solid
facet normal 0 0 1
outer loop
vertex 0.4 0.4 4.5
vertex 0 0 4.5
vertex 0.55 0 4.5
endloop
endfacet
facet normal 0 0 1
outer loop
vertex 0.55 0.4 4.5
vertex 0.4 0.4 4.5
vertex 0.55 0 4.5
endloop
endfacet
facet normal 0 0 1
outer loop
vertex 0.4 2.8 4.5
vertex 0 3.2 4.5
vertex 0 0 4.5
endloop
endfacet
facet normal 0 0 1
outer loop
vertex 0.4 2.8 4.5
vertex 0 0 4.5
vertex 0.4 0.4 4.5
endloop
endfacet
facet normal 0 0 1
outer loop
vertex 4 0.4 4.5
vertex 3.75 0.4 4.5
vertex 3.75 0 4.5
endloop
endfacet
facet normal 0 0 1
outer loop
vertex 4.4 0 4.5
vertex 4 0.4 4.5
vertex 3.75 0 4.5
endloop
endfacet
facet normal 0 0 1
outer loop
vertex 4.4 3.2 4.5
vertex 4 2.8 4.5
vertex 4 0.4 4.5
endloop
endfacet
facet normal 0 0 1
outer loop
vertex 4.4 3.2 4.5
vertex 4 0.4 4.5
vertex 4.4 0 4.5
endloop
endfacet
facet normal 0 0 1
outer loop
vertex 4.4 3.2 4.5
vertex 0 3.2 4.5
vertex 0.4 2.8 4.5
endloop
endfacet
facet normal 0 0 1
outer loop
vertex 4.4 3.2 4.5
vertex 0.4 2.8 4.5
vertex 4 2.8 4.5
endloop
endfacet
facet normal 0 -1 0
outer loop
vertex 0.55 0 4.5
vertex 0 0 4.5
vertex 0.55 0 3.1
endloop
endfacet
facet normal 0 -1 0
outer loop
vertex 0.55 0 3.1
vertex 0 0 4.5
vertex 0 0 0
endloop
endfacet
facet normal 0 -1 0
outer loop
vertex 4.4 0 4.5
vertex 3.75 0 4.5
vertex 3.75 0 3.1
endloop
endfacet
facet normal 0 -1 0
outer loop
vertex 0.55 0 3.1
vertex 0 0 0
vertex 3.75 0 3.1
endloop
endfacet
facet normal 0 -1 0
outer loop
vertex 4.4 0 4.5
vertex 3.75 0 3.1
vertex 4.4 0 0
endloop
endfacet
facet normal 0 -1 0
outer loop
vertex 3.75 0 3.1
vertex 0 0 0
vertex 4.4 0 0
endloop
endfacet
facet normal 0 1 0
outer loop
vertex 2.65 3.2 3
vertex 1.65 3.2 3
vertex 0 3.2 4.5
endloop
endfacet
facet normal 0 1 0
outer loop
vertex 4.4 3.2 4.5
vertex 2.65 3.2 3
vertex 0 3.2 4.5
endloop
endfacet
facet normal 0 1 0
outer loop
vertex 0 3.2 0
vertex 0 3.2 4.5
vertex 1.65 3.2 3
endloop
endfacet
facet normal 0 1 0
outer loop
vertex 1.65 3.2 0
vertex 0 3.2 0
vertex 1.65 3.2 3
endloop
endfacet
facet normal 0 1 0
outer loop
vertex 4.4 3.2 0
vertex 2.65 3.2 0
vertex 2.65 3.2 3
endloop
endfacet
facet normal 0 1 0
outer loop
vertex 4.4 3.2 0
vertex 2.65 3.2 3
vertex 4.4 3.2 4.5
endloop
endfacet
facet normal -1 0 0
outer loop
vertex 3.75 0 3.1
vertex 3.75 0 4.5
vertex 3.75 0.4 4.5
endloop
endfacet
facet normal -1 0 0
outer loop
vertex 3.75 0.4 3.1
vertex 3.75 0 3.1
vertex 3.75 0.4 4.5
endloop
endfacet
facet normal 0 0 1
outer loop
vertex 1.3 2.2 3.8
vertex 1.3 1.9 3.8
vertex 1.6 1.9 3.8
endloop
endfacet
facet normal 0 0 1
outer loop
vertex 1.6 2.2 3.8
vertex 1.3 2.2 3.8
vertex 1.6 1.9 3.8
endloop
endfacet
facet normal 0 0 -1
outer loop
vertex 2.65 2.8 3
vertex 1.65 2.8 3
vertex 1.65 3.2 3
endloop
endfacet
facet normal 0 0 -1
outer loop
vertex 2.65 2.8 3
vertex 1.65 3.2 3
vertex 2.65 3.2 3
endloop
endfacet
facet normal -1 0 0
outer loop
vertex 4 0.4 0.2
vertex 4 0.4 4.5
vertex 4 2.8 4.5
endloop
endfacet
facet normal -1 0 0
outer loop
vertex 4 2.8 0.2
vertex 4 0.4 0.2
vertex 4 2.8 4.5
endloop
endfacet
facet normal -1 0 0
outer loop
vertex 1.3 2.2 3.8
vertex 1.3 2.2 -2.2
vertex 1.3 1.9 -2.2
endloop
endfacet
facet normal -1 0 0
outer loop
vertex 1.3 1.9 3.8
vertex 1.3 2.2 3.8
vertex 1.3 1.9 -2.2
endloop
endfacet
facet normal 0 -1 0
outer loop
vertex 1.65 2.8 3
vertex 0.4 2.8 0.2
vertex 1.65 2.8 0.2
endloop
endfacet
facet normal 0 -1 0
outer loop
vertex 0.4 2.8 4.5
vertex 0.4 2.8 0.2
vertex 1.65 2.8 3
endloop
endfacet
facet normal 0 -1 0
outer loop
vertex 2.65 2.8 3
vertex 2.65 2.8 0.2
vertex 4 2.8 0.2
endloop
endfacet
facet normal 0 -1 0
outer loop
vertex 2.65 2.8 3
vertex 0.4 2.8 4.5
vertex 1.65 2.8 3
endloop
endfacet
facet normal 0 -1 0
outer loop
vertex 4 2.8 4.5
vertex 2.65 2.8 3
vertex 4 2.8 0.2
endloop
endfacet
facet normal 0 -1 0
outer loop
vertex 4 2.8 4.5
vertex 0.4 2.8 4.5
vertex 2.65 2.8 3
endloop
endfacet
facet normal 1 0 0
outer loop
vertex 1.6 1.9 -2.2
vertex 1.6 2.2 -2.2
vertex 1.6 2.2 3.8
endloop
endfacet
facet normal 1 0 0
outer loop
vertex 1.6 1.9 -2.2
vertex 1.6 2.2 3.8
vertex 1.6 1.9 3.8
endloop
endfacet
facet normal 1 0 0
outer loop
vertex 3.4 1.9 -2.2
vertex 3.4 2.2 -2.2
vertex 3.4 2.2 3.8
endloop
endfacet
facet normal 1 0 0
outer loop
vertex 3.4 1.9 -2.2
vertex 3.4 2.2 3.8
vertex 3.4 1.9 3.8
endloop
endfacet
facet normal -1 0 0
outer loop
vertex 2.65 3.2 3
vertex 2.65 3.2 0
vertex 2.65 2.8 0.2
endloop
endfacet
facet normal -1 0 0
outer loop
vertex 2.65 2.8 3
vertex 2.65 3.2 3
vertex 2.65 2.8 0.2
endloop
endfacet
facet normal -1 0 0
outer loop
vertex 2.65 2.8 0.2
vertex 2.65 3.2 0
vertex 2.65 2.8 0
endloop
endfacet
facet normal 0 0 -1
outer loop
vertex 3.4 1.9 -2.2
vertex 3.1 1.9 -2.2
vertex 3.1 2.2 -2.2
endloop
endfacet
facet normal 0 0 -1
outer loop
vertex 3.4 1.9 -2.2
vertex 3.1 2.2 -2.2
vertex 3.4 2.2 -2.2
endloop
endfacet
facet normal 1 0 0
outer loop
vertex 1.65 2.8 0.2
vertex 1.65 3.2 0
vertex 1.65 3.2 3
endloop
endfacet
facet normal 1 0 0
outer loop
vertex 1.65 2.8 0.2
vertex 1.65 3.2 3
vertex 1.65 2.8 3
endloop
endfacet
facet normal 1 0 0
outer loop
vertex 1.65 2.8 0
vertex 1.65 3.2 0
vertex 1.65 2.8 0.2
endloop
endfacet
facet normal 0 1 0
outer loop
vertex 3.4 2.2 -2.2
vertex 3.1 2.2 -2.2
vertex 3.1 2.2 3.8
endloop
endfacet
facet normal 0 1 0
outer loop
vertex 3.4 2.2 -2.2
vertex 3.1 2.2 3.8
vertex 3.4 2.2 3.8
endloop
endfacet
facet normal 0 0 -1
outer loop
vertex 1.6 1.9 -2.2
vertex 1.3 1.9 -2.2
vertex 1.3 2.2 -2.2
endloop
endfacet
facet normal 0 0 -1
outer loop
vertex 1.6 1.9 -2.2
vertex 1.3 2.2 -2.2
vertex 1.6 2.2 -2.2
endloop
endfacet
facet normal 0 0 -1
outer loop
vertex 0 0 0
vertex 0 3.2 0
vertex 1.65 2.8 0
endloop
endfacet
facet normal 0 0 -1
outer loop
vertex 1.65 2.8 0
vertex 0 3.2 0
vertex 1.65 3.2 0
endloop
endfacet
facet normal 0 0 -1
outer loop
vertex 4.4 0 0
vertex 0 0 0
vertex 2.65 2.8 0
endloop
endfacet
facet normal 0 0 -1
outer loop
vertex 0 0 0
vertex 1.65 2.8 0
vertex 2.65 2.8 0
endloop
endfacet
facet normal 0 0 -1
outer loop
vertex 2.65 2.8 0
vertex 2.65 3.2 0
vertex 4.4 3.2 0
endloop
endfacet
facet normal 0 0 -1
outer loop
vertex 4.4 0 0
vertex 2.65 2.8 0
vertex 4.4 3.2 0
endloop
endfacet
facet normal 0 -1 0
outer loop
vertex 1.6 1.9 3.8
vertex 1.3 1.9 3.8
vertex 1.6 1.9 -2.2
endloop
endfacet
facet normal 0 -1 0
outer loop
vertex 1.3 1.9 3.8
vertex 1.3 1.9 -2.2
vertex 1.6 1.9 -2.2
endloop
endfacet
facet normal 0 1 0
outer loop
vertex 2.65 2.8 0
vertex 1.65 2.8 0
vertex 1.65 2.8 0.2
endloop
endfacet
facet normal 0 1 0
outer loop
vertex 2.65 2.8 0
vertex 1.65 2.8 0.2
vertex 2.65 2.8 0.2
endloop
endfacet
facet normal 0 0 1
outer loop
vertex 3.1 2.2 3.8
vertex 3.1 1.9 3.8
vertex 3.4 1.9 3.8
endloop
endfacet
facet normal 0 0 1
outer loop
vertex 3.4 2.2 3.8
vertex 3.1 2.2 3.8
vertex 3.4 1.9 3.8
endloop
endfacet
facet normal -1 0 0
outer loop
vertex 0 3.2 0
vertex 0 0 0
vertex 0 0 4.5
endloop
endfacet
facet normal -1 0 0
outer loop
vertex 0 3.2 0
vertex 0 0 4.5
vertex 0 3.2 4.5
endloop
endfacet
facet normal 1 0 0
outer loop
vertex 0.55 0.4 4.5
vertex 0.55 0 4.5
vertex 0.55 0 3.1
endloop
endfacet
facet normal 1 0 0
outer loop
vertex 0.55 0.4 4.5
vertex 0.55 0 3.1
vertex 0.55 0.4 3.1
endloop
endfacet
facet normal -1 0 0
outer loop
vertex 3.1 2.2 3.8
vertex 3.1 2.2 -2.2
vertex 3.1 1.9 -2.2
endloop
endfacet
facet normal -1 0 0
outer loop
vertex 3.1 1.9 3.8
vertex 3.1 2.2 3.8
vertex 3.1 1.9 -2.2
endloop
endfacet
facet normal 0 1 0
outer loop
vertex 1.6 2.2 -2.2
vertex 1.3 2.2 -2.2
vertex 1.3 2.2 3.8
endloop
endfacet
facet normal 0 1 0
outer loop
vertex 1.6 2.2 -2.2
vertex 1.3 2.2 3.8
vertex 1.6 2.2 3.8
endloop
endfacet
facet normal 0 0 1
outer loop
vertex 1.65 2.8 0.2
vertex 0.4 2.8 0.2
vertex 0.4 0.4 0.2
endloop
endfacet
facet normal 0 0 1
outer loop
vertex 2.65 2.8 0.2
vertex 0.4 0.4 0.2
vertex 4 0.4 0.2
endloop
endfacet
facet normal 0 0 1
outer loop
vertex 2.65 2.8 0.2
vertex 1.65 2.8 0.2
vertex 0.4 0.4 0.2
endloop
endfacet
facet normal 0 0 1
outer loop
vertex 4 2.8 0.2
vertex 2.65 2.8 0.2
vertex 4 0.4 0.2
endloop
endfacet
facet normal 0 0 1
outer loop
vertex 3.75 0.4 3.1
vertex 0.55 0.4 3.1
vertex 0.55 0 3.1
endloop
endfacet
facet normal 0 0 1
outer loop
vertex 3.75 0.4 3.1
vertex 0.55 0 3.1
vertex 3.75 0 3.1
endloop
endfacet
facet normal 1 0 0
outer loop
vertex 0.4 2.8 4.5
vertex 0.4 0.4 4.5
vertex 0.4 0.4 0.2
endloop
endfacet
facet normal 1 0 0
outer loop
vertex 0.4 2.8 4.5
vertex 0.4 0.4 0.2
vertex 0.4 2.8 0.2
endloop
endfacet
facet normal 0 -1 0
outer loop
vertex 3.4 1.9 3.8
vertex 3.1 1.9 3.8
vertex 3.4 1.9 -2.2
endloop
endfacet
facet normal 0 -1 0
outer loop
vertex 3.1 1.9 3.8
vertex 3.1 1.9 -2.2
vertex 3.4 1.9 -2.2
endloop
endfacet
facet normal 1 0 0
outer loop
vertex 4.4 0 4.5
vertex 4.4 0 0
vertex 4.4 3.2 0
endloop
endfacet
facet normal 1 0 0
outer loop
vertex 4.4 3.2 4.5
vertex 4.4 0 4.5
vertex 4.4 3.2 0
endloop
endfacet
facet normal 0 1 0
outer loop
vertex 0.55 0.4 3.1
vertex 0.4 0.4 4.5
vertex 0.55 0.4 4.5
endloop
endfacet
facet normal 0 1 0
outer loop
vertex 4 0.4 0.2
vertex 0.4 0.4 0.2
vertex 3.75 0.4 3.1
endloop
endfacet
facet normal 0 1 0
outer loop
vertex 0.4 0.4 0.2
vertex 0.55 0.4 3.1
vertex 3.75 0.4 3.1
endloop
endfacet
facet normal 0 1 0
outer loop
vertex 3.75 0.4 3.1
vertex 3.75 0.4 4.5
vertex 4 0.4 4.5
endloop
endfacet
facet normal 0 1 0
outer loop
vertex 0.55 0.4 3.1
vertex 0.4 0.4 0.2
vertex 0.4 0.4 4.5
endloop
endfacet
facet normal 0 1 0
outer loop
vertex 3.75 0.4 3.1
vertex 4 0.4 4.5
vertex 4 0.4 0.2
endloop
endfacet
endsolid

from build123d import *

# Parameters (mm, degrees)
F0_W          = 4.4
F0_H          = 3.2
F1_DEPTH      = 4.5
F2_W          = 3.6
F2_H          = 2.4
F3_DEPTH      = 4.3
F4_W          = 3.2
F4_H          = 0.4
F5_DEPTH      = 1.4
F6_W          = 1
F6_H          = 0.4
F7_DEPTH      = 3
F8_W          = 0.3
F8_H          = 0.3
F9_DEPTH      = 2.2
F9_DEPTH_BACK = 3.8


with BuildPart() as f1:
    # F0 (on Top) → F1 (new body)
    with BuildSketch(Plane.XY):
        with Locations((2.2, 1.6)):
            Rectangle(F0_W, F0_H)
    extrude(amount=F1_DEPTH)

    # F2 (on face) → F3 (cut)
    with BuildSketch(Plane.XY.offset(4.5)):
        with Locations((2.2, 1.6)):
            Rectangle(F2_W, F2_H)
    extrude(amount=-F3_DEPTH, mode=Mode.SUBTRACT)

    # F4 (on face) → F5 (cut)
    with BuildSketch(Plane.XY.offset(4.5)):
        with Locations((2.15, 0.2)):
            Rectangle(F4_W, F4_H)
    extrude(amount=-F5_DEPTH, mode=Mode.SUBTRACT)

    # F6 (on face) → F7 (cut)
    with BuildSketch(Plane(origin=(0, 0, 0), x_dir=(1, 0, 0), z_dir=(0, 0, -1))):
        with Locations((2.15, -3)):
            Rectangle(F6_W, F6_H)
    extrude(amount=-F7_DEPTH, mode=Mode.SUBTRACT)


with BuildPart() as f9:
    # F8 (on face) → F9 (new body, two sides)
    with BuildSketch(Plane(origin=(0, 0, 0), x_dir=(1, 0, 0), z_dir=(0, 0, -1))) as f9_sk:
        with Locations((1.45, -2.05)):
            Rectangle(F8_W, F8_H)
        with Locations((3.25, -2.05)):
            Rectangle(F8_W, F8_H)
    extrude(amount=F9_DEPTH)
    extrude(f9_sk.sketch, amount=-F9_DEPTH_BACK)


solid = Compound([f1.part, f9.part])
